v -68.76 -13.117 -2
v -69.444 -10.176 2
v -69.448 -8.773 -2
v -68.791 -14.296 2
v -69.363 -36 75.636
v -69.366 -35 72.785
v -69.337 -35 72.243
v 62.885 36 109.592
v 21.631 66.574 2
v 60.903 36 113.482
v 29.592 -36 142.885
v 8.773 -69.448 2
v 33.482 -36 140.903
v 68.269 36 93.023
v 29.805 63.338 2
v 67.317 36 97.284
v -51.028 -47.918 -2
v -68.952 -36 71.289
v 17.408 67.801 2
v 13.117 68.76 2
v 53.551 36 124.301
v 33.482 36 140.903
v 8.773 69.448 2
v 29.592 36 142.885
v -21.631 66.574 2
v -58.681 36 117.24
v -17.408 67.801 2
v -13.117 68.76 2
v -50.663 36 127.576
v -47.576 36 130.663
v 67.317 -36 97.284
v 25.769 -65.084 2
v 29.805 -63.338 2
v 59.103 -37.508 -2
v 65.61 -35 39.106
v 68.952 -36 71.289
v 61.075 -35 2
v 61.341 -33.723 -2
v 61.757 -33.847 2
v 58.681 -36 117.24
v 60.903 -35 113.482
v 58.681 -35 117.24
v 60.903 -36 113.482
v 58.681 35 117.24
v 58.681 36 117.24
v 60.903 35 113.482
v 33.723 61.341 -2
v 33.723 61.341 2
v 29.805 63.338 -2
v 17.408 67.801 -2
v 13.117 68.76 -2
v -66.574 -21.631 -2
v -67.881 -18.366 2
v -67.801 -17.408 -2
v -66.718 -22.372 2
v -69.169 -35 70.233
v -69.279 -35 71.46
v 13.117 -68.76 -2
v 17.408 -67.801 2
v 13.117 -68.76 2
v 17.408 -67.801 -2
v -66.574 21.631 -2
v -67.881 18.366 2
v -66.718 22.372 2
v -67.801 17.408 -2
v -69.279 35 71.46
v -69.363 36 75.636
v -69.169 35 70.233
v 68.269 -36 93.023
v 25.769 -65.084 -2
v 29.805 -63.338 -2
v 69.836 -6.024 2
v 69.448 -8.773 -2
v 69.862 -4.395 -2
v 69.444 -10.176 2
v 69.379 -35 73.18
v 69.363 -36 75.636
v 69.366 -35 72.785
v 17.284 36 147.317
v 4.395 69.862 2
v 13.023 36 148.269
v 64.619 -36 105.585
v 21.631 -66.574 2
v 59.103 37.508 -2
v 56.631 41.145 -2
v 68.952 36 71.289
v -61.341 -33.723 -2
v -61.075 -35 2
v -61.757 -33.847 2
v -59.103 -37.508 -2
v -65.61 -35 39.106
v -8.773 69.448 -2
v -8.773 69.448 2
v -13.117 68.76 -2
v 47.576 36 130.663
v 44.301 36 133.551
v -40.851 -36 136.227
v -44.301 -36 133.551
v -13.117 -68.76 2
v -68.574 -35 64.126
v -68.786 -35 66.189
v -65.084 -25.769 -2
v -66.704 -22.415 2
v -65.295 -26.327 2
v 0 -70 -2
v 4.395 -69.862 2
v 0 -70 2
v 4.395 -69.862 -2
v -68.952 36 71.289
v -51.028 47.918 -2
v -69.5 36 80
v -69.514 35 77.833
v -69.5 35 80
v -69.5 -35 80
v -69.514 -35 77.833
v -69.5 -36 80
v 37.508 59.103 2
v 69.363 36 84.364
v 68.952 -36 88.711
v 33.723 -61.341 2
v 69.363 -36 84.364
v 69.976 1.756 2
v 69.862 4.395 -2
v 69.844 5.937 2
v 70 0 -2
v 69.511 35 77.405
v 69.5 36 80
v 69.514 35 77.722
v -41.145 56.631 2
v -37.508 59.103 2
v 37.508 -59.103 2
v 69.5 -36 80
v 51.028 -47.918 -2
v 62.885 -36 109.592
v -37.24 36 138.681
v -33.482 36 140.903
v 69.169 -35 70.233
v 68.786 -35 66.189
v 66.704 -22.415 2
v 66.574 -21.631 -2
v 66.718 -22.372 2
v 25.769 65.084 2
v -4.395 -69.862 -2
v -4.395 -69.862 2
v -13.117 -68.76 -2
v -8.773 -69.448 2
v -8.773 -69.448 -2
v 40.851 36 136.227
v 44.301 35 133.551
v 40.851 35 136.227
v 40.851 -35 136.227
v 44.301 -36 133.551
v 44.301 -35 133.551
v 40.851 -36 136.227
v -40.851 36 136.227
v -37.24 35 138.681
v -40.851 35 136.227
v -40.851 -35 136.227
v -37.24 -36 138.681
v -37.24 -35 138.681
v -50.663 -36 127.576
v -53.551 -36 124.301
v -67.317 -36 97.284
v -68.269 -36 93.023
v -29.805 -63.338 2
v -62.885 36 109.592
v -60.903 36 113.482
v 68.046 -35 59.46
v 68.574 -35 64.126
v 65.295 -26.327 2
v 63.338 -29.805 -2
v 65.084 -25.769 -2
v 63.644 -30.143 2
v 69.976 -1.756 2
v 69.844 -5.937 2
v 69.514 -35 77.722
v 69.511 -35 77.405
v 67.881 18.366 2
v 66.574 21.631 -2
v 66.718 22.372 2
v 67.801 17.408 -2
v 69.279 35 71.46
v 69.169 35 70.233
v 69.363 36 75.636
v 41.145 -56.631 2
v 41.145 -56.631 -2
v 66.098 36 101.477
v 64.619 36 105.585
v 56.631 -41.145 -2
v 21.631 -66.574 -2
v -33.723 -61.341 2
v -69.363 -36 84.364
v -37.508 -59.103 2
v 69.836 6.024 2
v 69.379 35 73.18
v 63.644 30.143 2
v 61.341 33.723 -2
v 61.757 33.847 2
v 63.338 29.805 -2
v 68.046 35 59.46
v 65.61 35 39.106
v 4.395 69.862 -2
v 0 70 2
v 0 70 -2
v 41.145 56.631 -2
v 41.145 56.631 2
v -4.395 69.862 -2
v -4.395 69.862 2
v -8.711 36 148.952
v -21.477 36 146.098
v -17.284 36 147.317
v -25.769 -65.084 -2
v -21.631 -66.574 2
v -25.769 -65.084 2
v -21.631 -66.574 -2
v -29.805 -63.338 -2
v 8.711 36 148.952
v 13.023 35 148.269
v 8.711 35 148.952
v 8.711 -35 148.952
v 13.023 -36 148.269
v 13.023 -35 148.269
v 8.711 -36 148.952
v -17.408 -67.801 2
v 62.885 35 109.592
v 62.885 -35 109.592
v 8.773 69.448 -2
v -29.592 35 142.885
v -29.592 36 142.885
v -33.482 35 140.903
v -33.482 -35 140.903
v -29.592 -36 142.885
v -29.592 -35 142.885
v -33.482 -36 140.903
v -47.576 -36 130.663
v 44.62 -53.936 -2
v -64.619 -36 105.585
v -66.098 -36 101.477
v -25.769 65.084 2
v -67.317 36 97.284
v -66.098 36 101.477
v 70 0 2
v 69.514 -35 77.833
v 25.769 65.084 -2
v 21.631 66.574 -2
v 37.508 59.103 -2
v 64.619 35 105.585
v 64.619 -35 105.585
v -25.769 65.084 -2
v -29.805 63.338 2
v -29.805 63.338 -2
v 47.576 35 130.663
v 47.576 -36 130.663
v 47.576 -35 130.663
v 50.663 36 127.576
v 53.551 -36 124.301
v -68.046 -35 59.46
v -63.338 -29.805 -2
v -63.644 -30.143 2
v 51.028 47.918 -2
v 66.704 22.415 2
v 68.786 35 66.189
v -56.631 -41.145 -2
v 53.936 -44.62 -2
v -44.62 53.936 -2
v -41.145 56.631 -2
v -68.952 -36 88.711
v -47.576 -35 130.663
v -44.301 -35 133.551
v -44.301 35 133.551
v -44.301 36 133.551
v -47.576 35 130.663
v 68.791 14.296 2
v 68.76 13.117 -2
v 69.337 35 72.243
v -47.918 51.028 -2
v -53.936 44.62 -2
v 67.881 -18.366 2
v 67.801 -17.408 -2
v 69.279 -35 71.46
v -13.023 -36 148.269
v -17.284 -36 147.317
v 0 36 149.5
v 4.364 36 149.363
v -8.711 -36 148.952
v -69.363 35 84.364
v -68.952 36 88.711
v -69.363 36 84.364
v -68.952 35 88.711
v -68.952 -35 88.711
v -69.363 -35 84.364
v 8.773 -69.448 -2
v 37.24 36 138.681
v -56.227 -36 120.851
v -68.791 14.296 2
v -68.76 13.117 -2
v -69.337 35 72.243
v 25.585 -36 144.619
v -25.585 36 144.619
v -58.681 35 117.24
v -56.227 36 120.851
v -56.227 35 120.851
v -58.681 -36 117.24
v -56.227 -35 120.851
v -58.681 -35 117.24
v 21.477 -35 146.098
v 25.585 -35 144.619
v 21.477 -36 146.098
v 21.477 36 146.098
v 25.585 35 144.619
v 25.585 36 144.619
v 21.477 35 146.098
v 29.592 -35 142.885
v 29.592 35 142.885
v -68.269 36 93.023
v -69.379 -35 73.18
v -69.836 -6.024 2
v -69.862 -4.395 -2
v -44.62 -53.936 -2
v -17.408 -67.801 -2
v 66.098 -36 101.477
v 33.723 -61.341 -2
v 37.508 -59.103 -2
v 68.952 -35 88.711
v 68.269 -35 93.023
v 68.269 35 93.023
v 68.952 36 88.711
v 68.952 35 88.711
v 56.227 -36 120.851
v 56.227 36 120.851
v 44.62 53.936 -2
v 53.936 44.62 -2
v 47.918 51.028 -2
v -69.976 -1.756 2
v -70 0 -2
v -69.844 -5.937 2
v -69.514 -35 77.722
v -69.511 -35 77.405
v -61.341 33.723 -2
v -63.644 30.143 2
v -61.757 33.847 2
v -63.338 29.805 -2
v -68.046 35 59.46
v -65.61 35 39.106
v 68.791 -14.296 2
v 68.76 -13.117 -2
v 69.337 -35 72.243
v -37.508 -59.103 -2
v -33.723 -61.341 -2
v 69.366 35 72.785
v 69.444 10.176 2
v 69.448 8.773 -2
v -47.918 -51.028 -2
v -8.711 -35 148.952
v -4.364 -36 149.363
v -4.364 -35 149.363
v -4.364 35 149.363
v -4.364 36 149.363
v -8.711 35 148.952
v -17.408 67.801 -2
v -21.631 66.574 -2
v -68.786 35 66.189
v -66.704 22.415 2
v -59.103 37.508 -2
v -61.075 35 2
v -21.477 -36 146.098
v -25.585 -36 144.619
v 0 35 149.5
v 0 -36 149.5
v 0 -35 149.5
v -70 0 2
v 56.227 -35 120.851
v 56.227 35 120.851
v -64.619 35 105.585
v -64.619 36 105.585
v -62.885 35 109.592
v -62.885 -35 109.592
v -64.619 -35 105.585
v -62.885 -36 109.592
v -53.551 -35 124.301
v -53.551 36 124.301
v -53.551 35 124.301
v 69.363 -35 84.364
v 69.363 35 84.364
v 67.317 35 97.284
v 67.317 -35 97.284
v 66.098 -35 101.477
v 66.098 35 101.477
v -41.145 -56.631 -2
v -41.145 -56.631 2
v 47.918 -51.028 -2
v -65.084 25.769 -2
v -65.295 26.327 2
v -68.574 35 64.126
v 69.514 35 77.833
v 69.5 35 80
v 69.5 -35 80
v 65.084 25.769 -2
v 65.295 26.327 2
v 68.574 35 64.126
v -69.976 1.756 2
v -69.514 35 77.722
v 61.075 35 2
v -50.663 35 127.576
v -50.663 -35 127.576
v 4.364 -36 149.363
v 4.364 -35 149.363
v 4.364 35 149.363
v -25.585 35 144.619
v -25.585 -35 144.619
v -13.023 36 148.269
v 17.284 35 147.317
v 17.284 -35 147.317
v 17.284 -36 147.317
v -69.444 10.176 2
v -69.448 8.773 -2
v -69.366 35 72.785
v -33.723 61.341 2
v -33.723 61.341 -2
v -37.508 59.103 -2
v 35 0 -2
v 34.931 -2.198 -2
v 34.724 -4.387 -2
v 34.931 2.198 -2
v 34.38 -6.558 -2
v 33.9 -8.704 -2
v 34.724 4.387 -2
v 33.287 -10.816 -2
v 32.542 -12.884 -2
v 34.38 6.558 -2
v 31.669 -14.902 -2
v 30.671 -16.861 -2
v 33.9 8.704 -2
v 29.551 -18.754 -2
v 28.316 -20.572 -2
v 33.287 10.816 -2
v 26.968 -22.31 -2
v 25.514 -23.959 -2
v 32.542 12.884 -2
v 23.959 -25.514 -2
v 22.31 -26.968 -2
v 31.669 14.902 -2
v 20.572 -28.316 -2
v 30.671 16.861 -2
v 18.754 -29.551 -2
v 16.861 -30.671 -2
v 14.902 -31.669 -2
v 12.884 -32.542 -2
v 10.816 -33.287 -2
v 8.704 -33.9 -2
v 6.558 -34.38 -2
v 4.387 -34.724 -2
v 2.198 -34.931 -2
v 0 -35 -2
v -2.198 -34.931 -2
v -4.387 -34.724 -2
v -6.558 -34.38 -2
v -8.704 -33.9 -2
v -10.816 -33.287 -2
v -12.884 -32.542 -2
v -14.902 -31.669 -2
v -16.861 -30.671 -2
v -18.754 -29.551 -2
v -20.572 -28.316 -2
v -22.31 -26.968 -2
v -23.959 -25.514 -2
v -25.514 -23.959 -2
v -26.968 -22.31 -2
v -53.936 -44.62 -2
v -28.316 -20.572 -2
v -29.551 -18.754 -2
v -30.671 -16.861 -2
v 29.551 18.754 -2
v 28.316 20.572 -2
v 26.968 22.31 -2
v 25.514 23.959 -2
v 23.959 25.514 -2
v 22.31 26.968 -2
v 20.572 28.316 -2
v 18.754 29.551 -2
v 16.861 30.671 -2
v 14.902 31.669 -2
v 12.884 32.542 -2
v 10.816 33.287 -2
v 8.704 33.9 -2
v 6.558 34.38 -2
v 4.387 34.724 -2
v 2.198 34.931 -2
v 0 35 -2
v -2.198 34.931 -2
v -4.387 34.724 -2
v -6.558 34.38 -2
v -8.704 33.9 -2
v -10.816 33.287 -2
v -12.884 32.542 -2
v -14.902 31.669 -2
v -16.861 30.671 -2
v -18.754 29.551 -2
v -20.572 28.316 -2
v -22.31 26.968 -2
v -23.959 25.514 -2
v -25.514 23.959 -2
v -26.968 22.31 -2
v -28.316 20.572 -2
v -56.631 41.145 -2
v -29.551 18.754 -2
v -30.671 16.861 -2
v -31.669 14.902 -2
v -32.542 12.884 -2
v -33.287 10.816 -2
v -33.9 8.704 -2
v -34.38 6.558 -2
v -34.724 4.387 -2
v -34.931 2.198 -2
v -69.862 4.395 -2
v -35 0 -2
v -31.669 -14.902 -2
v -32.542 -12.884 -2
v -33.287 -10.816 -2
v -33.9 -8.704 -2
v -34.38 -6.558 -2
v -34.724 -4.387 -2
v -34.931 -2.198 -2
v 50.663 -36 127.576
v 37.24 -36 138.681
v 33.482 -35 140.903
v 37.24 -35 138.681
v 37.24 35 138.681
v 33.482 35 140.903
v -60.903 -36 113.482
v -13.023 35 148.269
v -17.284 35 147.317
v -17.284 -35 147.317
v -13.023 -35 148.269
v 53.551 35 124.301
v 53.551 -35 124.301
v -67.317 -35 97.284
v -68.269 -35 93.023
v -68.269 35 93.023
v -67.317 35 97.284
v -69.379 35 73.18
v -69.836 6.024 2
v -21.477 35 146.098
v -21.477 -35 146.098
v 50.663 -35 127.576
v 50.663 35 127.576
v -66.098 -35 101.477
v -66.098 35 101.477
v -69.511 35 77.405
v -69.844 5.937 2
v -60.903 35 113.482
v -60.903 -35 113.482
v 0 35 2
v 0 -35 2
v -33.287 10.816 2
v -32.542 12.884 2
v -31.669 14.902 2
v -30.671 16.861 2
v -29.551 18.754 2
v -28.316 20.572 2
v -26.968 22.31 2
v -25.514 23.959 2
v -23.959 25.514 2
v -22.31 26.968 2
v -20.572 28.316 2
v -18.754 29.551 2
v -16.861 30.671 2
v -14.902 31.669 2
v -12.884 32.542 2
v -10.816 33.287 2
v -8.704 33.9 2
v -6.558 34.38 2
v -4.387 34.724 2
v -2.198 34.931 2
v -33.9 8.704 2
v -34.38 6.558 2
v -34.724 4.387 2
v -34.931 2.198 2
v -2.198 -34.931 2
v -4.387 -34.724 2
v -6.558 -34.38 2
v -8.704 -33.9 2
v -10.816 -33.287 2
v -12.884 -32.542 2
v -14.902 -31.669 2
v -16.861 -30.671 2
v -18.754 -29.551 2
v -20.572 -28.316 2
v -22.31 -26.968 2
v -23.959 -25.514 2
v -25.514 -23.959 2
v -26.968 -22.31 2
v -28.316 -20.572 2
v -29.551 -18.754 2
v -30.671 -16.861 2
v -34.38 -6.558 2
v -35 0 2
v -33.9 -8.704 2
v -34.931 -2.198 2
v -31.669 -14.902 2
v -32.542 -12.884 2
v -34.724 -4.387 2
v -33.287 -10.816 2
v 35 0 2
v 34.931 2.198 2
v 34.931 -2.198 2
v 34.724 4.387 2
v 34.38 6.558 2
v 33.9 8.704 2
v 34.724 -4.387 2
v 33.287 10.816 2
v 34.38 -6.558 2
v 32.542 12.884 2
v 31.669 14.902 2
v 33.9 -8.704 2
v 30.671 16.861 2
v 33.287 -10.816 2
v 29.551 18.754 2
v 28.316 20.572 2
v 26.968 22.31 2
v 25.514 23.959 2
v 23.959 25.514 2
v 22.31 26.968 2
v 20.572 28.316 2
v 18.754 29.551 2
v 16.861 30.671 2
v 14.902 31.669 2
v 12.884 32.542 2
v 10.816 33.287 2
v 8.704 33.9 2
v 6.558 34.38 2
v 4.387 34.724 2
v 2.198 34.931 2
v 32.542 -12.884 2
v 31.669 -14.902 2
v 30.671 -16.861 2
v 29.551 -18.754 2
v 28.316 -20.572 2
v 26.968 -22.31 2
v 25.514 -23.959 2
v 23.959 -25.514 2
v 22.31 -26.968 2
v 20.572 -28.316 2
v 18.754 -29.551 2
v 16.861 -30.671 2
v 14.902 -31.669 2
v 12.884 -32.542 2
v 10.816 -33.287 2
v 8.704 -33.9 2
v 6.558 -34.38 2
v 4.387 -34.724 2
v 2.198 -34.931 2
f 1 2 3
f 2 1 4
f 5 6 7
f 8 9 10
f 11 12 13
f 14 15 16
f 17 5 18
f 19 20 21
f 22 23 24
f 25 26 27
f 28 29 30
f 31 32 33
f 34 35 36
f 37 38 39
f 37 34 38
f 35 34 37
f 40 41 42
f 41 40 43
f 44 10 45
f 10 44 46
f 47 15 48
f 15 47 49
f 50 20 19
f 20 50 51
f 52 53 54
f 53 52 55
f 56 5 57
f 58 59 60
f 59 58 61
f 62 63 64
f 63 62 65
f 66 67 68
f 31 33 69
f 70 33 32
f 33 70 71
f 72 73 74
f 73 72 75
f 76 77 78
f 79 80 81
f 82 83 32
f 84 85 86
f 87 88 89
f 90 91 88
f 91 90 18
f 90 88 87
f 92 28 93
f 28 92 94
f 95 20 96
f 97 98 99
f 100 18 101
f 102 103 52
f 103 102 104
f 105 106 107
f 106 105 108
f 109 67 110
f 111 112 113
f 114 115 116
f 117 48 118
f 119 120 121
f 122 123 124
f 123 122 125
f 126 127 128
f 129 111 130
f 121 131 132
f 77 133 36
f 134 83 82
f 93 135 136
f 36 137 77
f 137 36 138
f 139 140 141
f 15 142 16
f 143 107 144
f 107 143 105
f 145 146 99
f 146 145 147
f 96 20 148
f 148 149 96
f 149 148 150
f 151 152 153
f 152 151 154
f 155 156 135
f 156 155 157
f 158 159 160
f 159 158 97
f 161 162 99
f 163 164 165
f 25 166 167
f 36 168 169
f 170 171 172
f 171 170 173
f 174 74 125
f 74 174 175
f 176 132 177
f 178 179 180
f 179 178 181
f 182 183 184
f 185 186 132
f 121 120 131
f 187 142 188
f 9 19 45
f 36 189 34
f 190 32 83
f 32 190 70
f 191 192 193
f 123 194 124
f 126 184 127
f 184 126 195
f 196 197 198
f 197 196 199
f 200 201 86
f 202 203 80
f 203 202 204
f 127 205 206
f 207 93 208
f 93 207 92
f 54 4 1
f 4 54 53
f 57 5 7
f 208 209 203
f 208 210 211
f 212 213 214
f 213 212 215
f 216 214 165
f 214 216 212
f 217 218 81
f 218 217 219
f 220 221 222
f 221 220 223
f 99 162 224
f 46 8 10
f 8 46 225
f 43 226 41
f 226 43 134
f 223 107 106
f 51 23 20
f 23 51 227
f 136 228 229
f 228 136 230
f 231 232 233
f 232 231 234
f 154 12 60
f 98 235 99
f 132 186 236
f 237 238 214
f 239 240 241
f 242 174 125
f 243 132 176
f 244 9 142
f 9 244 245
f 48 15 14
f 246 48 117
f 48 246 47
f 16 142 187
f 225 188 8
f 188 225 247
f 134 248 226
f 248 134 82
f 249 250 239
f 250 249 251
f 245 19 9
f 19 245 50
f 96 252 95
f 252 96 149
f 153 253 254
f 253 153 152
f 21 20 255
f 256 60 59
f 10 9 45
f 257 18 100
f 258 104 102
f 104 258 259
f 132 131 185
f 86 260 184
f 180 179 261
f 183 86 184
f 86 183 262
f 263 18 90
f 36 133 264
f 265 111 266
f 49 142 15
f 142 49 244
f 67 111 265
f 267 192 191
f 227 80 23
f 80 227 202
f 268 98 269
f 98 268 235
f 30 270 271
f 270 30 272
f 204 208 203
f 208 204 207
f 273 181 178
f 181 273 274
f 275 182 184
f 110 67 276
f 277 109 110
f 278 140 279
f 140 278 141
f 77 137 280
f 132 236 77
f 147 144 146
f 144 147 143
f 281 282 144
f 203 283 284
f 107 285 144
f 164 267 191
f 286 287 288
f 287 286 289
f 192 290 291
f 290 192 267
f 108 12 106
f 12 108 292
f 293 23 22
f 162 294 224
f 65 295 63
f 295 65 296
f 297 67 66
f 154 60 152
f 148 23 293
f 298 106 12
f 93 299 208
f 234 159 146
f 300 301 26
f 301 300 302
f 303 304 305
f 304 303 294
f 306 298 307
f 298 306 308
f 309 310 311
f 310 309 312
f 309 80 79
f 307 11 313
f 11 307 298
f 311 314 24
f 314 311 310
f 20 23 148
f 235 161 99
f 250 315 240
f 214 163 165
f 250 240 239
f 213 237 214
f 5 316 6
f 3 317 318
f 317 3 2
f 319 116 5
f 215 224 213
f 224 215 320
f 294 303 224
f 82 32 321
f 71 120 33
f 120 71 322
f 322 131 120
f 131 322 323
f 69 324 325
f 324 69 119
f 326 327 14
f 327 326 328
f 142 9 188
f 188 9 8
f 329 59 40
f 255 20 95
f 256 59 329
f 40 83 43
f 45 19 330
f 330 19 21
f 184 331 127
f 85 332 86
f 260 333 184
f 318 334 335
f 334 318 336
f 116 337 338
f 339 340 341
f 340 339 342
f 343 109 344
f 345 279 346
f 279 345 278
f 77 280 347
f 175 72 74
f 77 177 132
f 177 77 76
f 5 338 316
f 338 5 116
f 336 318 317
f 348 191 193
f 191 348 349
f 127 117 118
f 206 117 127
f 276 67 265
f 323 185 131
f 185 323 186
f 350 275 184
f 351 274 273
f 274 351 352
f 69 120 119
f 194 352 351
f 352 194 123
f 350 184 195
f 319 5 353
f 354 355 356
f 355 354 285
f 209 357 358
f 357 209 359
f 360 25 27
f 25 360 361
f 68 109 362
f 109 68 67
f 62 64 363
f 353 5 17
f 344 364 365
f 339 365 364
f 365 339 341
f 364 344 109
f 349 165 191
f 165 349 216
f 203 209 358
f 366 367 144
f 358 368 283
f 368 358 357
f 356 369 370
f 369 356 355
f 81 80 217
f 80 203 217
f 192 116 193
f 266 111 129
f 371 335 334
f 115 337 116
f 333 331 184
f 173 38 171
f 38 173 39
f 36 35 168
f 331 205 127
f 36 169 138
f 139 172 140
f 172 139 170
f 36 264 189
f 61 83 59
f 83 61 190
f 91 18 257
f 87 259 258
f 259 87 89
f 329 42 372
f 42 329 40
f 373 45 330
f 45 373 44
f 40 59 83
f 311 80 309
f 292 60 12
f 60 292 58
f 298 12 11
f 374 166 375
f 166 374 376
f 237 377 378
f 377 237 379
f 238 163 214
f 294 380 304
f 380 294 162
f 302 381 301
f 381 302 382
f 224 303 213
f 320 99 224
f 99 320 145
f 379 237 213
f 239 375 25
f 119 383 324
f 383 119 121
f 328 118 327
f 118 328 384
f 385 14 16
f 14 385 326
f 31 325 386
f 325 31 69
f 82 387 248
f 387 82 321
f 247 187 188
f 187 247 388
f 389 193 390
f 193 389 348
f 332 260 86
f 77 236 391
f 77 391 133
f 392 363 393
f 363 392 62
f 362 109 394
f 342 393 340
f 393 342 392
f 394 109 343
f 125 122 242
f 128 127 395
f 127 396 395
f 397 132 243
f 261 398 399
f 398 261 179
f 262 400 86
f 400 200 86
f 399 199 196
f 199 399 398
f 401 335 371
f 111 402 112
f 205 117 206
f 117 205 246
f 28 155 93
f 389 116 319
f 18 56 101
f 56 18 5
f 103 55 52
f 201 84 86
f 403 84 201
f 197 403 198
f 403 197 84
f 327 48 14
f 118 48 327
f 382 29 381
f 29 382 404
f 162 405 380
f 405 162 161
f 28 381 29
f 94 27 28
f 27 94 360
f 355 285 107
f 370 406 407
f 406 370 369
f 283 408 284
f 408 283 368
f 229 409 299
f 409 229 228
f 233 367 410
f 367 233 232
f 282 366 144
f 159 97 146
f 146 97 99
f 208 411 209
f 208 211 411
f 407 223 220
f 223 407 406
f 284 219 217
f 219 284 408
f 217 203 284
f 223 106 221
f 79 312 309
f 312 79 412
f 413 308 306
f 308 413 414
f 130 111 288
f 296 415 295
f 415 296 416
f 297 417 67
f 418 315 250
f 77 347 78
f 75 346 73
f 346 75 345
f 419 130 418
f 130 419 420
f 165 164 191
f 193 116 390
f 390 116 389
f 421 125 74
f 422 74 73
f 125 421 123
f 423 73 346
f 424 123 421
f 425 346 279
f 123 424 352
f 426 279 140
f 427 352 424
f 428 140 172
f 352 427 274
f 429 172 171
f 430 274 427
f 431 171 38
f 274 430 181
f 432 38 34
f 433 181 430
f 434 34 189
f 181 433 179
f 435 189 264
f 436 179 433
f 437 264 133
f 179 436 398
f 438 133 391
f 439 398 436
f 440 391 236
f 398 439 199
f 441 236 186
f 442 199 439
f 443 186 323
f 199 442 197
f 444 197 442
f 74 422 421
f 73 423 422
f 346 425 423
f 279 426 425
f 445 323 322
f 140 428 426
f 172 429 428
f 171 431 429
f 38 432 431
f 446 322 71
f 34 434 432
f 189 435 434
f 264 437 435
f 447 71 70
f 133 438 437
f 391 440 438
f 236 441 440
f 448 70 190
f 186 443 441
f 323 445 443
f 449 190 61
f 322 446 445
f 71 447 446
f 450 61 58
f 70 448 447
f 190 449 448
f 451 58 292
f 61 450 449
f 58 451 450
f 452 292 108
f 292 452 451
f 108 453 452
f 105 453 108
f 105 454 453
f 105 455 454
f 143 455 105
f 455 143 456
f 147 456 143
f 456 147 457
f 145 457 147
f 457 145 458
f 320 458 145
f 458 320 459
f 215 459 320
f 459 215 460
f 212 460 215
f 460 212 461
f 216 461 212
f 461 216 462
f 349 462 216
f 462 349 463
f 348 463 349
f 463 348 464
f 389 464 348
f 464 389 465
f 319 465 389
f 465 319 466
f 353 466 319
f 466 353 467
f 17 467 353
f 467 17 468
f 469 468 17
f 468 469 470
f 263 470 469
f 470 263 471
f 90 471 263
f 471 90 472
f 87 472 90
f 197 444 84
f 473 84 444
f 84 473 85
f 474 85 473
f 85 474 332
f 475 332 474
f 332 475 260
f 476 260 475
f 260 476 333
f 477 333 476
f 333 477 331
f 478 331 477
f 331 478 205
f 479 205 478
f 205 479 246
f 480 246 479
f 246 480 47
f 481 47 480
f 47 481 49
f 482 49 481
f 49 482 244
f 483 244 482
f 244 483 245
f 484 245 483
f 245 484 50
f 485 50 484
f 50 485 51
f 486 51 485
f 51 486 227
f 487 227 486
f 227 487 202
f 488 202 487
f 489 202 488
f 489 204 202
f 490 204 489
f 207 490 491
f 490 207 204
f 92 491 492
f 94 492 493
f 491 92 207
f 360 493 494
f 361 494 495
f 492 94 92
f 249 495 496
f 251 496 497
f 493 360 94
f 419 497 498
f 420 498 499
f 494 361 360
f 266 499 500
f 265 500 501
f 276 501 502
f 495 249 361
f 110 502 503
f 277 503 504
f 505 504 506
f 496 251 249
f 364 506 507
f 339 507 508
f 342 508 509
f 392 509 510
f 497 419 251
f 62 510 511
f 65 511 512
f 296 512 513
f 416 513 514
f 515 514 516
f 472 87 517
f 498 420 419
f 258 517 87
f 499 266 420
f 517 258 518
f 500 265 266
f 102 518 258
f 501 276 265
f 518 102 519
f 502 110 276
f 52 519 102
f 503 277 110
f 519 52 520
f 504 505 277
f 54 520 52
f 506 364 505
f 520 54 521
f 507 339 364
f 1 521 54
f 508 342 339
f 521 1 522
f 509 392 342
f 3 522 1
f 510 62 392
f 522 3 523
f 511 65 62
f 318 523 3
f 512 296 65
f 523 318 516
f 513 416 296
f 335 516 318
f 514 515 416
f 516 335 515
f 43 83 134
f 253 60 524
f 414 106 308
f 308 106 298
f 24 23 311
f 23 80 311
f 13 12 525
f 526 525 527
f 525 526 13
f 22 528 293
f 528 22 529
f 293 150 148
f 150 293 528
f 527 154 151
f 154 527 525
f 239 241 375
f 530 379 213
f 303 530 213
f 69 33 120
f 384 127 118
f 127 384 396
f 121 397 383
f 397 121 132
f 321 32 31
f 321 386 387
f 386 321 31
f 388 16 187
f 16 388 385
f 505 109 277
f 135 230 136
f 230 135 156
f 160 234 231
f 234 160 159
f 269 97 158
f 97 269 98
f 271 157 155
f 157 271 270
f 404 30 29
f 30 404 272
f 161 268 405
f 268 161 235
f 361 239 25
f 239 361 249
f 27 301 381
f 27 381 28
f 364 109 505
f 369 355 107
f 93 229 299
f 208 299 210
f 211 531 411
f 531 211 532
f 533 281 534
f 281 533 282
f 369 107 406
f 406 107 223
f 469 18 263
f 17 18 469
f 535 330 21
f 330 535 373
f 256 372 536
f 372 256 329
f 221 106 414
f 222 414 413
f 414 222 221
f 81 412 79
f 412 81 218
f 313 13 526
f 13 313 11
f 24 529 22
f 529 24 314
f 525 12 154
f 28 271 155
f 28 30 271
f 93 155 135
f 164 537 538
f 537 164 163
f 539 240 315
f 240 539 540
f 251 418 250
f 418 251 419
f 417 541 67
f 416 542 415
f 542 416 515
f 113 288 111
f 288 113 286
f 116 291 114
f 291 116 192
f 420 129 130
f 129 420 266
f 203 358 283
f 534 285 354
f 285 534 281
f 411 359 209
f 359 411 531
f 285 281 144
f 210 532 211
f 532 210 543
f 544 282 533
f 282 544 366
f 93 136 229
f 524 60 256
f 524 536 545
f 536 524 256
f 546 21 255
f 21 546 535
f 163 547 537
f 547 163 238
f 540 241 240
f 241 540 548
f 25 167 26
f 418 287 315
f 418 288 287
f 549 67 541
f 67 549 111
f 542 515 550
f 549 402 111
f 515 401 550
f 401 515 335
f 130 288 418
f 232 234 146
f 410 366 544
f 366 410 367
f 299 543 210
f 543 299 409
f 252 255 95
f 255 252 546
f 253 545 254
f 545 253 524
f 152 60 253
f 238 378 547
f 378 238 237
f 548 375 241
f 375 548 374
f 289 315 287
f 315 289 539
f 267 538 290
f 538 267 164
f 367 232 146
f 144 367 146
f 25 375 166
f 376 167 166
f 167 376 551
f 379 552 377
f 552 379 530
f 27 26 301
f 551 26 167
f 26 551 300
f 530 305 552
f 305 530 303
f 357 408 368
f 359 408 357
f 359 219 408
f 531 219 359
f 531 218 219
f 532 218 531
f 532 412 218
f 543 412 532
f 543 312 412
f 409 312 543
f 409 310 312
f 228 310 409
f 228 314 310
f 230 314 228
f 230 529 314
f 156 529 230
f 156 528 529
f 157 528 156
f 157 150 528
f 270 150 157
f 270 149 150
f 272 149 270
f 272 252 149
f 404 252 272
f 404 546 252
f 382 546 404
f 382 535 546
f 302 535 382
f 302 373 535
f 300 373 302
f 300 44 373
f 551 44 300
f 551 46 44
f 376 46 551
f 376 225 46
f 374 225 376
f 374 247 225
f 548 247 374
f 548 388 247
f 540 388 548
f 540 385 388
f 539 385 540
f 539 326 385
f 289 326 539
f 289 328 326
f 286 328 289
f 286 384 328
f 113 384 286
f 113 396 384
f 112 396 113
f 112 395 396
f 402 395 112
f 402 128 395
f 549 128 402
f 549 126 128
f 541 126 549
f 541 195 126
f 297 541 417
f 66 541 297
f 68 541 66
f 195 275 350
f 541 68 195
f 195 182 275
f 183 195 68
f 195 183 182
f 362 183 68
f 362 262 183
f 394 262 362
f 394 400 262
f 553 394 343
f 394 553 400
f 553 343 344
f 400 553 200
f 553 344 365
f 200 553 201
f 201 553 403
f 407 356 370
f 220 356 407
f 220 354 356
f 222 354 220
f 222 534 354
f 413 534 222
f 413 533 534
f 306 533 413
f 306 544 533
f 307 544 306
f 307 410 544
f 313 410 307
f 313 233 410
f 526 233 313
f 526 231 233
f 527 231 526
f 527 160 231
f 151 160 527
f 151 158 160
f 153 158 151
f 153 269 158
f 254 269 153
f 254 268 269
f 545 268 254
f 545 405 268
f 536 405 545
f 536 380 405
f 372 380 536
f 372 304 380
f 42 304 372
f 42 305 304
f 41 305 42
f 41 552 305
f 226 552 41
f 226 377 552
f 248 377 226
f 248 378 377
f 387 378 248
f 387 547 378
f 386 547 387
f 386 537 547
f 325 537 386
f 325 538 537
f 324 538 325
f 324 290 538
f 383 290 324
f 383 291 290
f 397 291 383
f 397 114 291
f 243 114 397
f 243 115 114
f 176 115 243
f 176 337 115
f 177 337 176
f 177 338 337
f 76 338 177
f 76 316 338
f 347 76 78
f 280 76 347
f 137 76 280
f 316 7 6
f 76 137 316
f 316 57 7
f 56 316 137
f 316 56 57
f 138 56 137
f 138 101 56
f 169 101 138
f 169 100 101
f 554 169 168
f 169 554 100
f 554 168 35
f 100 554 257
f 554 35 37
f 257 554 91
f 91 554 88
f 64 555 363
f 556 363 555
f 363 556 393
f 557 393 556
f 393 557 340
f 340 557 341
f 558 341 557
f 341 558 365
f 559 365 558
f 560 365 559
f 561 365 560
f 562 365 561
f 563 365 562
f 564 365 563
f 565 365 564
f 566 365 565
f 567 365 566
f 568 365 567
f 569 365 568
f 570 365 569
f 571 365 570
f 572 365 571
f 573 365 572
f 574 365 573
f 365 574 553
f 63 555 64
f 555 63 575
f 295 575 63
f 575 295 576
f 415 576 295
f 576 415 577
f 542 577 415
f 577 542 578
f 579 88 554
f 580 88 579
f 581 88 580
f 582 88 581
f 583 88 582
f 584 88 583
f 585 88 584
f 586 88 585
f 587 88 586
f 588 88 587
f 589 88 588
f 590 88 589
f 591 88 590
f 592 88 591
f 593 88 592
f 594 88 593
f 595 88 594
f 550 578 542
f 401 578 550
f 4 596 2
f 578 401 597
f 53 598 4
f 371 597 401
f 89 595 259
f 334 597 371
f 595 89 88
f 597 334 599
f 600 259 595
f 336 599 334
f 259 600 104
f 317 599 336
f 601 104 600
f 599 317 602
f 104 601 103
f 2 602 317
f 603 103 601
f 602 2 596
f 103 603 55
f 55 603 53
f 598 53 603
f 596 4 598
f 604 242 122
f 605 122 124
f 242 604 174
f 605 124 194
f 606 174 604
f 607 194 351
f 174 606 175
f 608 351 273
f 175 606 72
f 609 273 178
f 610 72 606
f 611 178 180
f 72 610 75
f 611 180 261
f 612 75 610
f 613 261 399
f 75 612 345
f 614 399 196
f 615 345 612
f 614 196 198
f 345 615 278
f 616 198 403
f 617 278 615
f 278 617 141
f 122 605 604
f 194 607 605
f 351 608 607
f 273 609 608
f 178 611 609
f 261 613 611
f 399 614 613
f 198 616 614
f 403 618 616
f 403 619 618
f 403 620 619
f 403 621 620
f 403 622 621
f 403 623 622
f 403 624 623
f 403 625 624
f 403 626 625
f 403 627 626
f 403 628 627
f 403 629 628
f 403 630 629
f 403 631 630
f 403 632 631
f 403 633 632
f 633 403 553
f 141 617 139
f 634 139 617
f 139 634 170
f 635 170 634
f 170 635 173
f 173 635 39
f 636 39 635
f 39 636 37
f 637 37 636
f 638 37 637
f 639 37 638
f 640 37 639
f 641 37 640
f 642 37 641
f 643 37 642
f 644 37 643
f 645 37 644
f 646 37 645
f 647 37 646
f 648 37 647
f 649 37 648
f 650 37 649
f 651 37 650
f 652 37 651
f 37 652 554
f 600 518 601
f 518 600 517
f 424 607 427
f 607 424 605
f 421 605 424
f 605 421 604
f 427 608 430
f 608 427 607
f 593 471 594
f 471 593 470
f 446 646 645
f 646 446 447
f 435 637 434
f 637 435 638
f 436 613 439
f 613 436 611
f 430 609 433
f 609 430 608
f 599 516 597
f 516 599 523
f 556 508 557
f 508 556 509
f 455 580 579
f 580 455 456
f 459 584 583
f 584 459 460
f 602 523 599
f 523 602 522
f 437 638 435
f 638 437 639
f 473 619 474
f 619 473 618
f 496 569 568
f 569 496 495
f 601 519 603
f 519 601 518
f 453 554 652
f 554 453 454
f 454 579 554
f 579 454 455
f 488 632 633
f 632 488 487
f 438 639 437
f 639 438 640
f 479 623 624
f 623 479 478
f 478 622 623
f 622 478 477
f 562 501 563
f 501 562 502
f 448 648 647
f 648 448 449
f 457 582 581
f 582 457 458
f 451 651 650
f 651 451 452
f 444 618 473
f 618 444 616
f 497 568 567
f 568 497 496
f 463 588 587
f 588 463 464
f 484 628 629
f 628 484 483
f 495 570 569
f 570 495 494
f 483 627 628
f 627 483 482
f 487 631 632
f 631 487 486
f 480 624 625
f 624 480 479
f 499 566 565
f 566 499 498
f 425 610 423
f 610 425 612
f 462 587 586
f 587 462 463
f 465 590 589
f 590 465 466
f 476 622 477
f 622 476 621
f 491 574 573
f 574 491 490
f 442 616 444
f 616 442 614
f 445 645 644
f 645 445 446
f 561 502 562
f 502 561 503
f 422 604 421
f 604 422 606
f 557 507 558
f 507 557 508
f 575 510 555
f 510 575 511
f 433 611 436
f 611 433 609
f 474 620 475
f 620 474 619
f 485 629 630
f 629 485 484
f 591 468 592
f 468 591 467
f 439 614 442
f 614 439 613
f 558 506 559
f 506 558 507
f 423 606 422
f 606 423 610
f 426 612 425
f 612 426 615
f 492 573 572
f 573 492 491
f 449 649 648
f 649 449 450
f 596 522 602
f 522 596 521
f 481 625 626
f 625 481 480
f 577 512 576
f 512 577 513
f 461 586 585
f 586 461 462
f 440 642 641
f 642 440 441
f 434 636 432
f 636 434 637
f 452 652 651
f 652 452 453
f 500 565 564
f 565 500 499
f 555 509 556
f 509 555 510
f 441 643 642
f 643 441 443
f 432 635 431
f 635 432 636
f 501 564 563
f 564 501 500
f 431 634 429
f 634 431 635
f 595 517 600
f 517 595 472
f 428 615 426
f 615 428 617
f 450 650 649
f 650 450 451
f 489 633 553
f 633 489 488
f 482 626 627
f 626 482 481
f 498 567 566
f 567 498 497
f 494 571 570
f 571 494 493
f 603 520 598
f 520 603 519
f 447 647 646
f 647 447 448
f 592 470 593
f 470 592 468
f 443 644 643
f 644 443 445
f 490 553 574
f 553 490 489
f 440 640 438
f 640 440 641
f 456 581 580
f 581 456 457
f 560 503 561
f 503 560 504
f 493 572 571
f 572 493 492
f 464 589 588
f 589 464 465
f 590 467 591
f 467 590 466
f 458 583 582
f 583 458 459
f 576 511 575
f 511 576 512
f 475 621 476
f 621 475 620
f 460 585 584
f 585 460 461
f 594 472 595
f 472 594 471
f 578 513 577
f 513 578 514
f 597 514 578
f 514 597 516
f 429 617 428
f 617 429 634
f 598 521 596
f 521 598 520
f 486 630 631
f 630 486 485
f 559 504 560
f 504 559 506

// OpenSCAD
//base radius
r=70;

//base height
b=4;

//height
h=150;

//thickness
t=70;

// translate height
y=80;

difference(){
hull(){
cylinder(h = b, r=r, center=true, $fn=100); //bottom
translate([0,0,y])rotate([90,0,0])cylinder(h = t+2, r=r-0.5, center=true, $fn=100); //top
}
rotate([0,0,90])translate([0,0,h/2+b/2])cube(size = [t,2*t,h], center = true);
cylinder(h=b+1, r=r/2, center=true, $fn=100); //cut out bottom
}
